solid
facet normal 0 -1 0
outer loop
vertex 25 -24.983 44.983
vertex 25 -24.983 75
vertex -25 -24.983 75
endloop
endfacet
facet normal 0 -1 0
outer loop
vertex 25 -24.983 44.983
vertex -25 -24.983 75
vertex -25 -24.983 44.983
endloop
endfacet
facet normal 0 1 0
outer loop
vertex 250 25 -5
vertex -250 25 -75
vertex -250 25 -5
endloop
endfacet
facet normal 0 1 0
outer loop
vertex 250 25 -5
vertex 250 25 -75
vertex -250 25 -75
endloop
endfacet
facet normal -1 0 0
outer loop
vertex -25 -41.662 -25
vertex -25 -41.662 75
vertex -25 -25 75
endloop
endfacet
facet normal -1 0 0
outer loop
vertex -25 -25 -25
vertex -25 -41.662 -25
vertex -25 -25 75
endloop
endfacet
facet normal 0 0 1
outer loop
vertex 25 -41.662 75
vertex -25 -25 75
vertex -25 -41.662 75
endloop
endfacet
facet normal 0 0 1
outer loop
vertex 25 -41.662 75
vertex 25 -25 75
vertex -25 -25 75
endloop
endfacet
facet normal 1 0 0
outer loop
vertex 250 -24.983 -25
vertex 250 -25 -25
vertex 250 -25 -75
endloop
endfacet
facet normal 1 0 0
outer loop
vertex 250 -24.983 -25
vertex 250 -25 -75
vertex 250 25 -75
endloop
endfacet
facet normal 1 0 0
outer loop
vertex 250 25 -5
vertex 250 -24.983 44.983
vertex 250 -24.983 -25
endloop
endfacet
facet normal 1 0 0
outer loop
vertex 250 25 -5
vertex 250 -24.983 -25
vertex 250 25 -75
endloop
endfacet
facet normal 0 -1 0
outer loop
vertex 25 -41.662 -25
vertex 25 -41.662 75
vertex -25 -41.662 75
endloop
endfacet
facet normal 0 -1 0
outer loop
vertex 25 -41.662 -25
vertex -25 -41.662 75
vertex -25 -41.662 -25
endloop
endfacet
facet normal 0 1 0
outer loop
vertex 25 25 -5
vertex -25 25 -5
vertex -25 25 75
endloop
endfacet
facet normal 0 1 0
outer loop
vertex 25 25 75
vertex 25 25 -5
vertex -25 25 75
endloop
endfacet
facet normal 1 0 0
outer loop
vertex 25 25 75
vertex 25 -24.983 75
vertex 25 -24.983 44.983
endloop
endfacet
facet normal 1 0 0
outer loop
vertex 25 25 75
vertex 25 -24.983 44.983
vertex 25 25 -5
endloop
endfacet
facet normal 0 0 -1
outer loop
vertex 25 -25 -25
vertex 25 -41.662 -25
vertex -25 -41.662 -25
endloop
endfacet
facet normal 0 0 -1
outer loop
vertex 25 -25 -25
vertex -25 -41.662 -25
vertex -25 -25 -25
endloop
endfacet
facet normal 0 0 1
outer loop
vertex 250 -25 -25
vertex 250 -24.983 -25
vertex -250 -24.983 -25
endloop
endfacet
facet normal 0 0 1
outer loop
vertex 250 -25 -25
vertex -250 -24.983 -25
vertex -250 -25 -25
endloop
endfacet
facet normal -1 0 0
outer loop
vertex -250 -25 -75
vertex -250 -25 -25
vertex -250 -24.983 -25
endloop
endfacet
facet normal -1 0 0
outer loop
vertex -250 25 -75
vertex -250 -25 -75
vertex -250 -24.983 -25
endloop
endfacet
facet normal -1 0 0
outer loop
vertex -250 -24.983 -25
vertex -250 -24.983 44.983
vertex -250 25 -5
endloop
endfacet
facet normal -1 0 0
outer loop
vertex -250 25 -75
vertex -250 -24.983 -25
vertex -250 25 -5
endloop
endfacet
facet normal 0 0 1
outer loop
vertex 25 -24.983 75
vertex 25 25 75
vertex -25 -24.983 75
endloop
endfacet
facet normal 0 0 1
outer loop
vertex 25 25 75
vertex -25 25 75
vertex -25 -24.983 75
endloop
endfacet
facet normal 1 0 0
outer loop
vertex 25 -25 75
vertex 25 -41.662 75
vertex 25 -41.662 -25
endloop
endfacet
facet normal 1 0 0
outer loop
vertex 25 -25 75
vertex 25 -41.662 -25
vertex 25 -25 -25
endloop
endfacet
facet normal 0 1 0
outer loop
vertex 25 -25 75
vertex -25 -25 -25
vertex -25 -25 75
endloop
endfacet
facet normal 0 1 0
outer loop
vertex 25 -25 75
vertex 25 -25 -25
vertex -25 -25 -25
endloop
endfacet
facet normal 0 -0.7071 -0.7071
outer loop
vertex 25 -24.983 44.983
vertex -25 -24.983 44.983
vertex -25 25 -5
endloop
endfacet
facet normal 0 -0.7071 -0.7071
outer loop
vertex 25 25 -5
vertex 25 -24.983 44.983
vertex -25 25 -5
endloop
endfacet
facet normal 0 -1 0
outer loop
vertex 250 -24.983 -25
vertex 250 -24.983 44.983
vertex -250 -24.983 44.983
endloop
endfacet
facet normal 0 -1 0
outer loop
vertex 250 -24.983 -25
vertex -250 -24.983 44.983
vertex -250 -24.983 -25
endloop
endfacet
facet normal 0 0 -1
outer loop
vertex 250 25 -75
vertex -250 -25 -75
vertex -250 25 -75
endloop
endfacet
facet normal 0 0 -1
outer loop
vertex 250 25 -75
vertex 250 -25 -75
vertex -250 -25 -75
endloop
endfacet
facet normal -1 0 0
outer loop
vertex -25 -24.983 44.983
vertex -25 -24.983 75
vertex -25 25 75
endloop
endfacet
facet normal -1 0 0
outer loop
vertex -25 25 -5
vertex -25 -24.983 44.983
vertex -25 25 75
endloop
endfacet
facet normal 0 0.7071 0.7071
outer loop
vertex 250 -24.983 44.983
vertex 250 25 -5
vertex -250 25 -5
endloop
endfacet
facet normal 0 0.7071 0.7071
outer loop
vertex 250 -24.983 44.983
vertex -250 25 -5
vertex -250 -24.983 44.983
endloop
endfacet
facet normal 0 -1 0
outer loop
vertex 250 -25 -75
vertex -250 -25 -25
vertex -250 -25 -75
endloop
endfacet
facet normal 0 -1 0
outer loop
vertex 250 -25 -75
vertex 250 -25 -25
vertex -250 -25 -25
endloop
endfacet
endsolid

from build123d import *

# Parameters (mm, degrees)
F1_DEPTH = 250
F2_DEPTH = 25


with BuildPart() as f1:
    # F0 (on Right) → F1 (new body, symmetric)
    with BuildSketch(Plane.YZ):
        Polygon((25, -75), (25, -5), (-24.982929, 44.982929), (-24.982929, -25), (-25, -25), (-25, -75), align=None)
    extrude(amount=F1_DEPTH, both=True)


with BuildPart() as f2:
    # F0 (on Right) → F2 (new body, symmetric)
    with BuildSketch(Plane.YZ):
        Polygon((25, -5), (25, 75), (-24.982929, 75), (-24.982929, 44.982929), align=None)
        Polygon((-25, 45), (-25, 75), (-41.662153, 75), (-41.662153, -25), (-25, -25), align=None)
    extrude(amount=F2_DEPTH, both=True)


solid = Compound([f1.part, f2.part])
